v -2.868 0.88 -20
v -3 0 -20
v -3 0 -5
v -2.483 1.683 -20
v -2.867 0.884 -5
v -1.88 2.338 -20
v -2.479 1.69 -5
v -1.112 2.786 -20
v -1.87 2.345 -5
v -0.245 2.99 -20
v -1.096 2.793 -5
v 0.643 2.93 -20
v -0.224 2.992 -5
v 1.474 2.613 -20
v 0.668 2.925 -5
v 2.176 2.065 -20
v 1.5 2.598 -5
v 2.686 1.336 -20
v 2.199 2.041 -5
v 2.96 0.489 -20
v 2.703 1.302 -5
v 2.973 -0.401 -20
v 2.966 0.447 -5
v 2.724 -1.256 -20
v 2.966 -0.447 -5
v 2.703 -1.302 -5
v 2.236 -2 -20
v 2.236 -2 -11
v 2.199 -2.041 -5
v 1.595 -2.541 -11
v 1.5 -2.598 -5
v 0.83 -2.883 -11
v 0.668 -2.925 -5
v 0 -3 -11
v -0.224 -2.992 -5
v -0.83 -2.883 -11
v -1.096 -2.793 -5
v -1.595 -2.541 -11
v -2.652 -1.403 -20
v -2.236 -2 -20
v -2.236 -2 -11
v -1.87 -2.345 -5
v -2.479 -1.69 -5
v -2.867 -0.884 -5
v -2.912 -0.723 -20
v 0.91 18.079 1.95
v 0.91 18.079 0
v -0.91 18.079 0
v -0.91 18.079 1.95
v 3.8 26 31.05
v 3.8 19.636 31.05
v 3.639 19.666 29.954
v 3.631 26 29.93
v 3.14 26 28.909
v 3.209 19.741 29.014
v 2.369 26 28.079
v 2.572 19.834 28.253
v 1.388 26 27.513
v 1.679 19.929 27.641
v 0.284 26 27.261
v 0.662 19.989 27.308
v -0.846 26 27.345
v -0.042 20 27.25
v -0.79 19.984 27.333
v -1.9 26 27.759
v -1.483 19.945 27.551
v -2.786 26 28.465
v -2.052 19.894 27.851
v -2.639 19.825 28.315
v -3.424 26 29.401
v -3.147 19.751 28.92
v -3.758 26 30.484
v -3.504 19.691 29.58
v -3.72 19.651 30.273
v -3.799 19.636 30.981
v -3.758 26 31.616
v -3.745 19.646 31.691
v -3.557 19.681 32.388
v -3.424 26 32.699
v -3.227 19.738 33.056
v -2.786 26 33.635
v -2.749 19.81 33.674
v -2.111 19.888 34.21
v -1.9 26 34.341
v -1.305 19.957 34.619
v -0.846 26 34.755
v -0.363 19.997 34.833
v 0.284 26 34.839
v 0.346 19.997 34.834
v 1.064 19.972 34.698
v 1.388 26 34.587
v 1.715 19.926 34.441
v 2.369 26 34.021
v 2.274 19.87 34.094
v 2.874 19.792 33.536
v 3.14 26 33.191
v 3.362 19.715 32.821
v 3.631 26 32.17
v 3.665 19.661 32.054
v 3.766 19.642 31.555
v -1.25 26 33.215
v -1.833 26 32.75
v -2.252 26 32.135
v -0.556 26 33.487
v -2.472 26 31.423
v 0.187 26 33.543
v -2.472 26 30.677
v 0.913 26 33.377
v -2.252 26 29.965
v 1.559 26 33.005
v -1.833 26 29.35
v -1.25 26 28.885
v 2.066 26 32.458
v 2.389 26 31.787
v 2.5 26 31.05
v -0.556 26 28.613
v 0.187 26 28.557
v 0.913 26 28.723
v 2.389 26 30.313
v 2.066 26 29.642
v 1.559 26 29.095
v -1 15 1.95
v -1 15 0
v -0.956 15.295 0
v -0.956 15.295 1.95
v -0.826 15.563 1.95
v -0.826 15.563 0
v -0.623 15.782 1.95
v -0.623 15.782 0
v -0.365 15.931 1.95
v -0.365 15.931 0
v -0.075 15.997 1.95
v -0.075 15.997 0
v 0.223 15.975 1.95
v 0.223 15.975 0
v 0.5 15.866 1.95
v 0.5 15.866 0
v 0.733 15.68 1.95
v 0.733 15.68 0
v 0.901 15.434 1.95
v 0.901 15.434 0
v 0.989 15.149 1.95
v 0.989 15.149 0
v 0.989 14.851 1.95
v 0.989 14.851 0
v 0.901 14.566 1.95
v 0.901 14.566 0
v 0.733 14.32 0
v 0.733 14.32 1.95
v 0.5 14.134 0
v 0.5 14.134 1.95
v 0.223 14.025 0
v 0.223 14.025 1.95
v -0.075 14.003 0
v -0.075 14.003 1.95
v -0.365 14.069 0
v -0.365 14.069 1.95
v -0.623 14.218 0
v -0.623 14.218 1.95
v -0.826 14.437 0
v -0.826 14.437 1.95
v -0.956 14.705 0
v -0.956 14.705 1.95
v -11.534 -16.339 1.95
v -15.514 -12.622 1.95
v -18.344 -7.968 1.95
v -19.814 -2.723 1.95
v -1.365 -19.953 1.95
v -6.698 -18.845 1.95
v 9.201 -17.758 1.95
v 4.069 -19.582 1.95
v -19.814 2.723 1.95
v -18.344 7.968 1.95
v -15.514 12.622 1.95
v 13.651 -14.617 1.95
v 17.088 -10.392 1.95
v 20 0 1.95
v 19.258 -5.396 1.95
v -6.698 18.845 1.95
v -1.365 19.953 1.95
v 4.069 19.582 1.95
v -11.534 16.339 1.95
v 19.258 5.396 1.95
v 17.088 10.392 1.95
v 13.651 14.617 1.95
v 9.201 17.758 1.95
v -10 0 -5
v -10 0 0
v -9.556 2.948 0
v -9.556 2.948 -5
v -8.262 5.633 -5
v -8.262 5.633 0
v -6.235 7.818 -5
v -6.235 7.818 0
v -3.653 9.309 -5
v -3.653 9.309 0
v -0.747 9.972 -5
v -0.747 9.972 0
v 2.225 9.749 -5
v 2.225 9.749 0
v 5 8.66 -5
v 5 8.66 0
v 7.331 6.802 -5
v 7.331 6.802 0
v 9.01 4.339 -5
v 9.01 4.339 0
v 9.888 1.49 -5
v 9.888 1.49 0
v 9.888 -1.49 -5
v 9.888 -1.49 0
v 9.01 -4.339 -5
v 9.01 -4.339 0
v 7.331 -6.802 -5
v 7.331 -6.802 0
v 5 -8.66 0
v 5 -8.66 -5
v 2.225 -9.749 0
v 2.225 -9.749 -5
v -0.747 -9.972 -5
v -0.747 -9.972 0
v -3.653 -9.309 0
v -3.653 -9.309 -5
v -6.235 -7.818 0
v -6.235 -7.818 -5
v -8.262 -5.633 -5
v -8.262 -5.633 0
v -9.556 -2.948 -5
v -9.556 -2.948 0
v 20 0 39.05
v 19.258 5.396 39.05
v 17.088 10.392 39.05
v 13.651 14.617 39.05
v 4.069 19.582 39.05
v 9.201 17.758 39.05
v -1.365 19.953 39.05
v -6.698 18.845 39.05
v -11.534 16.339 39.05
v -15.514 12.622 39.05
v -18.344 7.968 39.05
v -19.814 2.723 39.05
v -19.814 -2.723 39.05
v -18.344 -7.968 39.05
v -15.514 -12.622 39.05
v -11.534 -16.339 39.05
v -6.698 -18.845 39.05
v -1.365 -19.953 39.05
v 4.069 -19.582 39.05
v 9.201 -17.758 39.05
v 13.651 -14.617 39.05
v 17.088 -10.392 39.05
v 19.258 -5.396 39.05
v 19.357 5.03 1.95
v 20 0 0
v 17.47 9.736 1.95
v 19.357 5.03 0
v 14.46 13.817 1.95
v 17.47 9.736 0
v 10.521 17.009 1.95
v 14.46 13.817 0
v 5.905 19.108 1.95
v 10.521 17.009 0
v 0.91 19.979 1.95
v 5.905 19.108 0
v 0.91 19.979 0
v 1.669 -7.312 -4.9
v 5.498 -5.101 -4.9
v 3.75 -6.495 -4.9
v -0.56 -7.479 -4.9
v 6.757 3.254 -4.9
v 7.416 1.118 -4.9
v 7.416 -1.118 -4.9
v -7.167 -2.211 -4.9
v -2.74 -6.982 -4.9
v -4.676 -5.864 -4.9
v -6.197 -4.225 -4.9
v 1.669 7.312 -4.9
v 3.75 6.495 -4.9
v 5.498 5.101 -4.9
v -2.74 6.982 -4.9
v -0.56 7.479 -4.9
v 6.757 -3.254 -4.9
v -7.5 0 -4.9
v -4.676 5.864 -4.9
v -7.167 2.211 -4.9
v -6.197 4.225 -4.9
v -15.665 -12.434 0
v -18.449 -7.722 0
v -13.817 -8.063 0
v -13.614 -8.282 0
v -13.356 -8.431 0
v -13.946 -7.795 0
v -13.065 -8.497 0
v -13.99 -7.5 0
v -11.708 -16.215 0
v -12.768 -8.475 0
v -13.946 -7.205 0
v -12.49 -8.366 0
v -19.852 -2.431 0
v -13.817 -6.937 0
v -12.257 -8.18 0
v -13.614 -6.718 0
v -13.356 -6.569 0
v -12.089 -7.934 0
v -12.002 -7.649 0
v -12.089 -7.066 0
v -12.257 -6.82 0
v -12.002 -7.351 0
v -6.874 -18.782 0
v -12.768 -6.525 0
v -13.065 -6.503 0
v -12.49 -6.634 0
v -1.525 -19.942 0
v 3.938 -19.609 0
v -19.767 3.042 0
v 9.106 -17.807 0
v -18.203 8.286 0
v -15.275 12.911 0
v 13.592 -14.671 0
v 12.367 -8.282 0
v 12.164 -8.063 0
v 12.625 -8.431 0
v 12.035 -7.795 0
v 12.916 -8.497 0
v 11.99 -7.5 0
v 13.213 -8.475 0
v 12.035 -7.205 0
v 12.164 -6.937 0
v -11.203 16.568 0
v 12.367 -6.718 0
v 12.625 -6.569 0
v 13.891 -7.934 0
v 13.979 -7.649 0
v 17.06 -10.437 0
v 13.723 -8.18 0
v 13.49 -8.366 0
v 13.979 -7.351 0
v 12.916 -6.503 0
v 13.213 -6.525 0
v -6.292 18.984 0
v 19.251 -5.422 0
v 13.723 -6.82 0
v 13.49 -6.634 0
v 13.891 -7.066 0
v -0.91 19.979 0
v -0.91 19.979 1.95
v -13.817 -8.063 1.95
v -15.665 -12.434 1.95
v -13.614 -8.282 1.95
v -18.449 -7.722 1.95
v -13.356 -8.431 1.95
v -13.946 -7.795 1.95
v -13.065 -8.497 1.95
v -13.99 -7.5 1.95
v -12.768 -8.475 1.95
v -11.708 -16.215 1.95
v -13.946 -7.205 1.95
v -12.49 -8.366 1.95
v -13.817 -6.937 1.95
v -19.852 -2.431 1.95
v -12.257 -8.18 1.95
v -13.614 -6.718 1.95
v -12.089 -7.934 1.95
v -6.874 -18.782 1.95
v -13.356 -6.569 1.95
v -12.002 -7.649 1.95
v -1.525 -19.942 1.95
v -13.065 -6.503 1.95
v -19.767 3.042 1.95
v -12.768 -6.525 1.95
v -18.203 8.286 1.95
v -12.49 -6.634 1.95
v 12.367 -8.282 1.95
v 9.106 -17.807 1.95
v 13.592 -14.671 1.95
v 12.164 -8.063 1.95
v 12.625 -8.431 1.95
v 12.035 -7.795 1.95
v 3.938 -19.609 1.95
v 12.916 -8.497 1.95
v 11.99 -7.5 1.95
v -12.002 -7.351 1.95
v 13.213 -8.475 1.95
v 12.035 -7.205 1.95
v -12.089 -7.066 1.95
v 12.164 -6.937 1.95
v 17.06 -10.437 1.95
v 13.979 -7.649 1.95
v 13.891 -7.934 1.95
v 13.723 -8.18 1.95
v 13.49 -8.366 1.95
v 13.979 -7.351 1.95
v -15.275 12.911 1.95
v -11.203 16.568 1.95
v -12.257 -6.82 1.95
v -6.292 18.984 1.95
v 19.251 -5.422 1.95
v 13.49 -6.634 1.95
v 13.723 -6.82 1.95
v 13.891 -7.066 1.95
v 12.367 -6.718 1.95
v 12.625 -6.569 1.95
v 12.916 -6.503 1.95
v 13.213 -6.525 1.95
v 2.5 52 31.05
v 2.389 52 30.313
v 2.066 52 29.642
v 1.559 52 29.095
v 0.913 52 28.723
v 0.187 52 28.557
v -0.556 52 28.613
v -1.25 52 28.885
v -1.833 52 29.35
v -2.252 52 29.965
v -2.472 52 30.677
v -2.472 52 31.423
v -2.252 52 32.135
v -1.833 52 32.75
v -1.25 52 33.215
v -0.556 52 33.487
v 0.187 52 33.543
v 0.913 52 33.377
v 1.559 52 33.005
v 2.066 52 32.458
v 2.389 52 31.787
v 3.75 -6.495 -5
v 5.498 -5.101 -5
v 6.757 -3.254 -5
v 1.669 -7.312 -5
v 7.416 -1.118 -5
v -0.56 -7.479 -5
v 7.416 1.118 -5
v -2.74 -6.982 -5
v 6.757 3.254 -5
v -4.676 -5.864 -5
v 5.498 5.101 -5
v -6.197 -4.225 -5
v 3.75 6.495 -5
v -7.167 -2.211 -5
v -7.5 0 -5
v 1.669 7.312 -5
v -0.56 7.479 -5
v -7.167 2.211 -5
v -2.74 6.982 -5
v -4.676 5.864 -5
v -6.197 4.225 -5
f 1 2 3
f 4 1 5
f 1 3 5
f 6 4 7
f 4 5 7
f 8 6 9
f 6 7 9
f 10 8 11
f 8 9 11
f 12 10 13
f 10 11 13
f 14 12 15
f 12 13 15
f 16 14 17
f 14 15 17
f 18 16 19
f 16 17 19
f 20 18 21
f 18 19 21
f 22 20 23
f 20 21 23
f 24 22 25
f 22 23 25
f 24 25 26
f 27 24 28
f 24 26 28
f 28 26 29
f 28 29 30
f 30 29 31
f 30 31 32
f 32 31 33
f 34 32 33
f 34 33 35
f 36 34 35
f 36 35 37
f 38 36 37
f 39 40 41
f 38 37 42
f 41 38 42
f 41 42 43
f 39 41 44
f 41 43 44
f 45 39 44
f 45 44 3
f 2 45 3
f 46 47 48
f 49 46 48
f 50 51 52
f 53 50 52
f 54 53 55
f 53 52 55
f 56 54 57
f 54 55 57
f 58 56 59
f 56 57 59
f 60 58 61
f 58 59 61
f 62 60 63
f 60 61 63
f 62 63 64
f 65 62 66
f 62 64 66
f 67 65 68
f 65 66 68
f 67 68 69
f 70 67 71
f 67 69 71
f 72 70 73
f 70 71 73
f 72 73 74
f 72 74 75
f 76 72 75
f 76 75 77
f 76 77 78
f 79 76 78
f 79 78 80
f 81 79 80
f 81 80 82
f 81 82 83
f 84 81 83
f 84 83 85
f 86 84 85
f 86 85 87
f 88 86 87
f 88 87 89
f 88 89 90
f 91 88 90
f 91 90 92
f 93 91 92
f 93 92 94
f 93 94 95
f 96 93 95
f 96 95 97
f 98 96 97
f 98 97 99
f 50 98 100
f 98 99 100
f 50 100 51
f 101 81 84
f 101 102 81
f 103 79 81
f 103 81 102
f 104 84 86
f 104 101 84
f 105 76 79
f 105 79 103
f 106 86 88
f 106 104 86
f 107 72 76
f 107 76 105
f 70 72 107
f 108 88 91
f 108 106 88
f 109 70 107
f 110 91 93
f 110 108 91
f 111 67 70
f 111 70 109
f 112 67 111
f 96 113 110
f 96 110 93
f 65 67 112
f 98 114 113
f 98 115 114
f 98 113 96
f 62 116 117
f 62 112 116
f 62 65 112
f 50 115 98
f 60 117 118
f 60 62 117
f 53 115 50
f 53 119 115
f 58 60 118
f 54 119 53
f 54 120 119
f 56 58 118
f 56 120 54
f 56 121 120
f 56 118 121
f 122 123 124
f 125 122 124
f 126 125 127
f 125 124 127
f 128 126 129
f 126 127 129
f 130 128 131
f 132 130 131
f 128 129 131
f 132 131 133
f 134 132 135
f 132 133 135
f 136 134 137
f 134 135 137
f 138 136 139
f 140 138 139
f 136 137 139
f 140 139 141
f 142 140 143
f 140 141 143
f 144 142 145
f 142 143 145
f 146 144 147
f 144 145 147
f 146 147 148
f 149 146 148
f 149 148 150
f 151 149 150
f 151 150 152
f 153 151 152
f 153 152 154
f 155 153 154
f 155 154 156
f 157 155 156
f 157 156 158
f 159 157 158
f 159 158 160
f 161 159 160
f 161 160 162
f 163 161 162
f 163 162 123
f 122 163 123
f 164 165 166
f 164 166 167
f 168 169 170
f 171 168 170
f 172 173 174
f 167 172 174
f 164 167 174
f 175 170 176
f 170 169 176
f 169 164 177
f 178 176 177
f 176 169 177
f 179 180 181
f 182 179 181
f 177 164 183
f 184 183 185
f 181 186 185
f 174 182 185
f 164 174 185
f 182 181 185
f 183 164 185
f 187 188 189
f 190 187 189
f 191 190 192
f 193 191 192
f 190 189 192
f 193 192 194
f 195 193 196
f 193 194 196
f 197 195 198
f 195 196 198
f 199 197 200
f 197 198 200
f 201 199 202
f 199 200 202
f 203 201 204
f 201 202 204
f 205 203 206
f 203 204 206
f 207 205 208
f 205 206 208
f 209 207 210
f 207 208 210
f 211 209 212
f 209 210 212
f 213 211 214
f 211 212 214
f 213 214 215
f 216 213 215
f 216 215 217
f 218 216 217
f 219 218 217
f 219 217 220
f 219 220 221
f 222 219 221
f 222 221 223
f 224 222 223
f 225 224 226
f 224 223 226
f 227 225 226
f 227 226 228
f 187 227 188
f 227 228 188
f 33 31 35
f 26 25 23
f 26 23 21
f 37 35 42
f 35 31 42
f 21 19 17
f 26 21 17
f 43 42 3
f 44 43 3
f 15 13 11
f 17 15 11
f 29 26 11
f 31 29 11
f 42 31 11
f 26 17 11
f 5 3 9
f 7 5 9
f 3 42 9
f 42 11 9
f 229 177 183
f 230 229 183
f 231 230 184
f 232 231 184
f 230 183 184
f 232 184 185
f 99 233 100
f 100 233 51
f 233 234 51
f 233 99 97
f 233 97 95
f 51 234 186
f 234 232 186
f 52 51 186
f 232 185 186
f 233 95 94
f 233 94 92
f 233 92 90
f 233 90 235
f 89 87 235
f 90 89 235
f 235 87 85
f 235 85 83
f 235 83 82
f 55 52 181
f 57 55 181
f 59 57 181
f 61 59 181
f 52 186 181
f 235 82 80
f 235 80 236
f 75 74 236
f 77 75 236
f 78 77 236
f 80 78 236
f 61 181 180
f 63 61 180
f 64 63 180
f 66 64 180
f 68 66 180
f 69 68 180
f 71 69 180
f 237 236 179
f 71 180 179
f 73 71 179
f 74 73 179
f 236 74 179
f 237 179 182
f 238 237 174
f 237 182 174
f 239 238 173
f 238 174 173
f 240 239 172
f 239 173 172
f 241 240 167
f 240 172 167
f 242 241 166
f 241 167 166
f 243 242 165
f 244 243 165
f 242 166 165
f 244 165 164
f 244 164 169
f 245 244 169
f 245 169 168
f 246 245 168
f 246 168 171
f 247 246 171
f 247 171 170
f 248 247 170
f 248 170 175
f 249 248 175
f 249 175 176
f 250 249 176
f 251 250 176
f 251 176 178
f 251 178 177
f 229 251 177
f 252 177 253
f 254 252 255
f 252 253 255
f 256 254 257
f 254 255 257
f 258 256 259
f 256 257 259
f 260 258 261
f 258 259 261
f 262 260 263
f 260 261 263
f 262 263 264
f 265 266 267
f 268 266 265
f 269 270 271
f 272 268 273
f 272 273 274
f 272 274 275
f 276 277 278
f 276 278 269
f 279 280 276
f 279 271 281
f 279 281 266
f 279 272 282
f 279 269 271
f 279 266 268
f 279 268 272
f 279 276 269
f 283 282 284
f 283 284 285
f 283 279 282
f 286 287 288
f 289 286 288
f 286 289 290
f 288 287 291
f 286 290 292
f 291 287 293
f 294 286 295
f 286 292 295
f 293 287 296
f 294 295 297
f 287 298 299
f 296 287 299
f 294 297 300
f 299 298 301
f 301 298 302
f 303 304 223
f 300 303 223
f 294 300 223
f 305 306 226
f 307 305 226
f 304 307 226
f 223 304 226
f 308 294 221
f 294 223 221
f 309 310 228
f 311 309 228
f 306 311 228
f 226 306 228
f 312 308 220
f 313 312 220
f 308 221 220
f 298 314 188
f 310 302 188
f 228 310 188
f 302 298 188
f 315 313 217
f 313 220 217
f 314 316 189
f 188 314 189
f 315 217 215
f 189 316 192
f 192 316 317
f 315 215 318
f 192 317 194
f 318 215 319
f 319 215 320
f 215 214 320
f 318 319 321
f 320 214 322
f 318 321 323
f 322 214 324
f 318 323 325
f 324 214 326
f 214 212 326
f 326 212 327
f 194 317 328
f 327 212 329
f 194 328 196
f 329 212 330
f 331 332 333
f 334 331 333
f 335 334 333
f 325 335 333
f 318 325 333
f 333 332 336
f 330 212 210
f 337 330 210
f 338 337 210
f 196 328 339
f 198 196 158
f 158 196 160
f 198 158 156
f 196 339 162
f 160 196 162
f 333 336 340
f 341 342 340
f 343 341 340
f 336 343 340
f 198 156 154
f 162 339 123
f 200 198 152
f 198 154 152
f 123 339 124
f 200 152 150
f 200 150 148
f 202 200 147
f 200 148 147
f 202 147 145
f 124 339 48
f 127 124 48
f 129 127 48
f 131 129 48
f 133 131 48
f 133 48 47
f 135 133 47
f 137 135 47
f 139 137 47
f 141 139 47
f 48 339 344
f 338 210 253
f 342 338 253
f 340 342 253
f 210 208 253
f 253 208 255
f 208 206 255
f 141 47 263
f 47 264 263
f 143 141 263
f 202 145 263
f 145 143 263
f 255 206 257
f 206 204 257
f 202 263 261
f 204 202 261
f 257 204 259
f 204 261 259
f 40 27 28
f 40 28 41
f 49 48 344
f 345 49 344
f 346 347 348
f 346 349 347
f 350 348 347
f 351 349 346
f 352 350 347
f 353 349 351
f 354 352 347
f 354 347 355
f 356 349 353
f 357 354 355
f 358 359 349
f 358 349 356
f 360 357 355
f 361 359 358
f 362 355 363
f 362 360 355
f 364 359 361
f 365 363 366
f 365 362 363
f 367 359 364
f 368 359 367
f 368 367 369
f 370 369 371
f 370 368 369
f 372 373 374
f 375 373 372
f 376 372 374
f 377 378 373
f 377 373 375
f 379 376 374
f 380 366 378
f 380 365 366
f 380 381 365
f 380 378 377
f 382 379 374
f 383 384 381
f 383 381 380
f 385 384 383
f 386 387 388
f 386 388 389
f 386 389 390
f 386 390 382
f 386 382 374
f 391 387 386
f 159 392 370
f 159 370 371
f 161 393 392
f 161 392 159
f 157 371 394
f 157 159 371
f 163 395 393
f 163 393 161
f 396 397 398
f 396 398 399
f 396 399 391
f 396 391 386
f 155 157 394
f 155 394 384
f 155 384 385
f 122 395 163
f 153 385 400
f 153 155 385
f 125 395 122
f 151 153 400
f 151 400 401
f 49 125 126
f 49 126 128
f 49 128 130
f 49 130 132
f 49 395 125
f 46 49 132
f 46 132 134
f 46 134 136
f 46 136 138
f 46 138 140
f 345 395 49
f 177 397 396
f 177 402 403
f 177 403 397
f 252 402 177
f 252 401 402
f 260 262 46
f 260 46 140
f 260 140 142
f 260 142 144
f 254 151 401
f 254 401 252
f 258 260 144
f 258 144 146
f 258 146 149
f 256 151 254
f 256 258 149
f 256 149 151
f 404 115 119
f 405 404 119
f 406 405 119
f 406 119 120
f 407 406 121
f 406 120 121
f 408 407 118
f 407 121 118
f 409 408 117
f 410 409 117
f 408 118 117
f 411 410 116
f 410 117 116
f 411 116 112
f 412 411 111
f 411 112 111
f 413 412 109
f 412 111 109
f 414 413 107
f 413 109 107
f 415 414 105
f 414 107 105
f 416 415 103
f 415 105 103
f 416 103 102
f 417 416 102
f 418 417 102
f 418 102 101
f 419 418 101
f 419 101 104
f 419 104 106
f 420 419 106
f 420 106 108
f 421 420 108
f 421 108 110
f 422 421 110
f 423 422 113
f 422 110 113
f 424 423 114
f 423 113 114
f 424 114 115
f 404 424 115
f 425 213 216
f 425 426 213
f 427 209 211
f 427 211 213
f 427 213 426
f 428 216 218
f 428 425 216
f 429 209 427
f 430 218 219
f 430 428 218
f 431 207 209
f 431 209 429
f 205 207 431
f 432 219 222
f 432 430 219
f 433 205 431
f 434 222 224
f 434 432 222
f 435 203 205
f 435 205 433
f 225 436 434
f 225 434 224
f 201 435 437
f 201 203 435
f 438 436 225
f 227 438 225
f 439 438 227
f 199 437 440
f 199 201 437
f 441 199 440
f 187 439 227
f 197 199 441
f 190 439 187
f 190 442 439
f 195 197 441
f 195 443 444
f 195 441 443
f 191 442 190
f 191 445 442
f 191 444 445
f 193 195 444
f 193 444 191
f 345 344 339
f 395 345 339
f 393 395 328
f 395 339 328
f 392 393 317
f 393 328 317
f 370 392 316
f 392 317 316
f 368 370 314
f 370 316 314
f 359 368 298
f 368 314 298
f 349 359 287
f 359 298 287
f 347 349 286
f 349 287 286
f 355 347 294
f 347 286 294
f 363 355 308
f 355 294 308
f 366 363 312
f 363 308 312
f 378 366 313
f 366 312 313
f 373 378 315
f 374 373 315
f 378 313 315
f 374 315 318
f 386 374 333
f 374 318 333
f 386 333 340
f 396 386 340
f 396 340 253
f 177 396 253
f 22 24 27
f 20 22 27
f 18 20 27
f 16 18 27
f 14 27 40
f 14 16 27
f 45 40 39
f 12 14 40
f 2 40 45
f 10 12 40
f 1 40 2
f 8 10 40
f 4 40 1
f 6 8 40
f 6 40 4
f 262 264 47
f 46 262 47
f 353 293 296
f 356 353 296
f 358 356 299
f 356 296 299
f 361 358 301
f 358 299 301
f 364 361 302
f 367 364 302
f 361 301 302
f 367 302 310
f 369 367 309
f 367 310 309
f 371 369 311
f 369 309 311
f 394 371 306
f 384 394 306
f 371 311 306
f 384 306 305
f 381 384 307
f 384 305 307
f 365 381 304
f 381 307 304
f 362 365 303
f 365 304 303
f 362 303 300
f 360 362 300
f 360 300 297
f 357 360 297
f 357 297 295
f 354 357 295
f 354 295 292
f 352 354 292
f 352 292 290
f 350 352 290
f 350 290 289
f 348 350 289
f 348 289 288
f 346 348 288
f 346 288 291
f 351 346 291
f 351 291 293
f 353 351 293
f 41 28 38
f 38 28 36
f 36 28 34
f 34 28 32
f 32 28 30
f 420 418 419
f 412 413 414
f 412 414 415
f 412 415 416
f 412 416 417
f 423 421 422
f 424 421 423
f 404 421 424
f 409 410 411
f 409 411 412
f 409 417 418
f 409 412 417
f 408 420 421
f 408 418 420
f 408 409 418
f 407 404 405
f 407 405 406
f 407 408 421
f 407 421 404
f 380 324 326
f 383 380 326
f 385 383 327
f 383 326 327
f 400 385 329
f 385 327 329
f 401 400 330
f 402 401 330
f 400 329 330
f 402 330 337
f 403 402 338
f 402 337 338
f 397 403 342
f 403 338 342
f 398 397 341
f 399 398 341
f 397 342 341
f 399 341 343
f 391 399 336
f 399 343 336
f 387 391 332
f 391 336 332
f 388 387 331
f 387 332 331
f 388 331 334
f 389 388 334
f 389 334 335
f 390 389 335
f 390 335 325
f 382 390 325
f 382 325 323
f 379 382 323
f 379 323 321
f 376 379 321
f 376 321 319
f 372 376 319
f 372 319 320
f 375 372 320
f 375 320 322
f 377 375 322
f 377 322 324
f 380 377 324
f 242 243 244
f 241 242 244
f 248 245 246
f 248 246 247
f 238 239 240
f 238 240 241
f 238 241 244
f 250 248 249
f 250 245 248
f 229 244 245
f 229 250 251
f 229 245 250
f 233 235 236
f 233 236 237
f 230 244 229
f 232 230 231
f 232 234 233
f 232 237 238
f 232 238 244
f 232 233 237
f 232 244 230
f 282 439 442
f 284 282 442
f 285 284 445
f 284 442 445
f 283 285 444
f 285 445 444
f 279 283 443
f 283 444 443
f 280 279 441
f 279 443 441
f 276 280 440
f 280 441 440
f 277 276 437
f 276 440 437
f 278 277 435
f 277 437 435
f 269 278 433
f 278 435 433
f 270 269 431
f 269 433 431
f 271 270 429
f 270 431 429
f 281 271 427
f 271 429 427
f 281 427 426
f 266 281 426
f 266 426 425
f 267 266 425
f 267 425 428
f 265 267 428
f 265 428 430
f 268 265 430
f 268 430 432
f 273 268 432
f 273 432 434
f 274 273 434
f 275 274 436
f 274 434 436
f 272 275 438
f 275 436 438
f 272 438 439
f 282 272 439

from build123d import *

# Parameters (mm, degrees)
SKETCH1_R           = 20
BOSS_EXTRUDE1_DEPTH = 1.95
SKETCH2_R           = 10
BOSS_EXTRUDE2_DEPTH = 5
SKETCH3_R           = 3
BOSS_EXTRUDE3_DEPTH = 15
SKETCH4_R           = 1
CUT_EXTRUDE1_DEPTH  = 10
CUT_EXTRUDE2_DEPTH  = 2.3
SKETCH6_R           = 20
BOSS_EXTRUDE5_DEPTH = 37.1
SKETCH7_R           = 7.5
CUT_EXTRUDE3_DEPTH  = 0.1
SKETCH9_R           = 3.8
BOSS_EXTRUDE6_DEPTH = 26
SKETCH10_R          = 2.5
BOSS_EXTRUDE7_DEPTH = 26
SKETCH11_W          = 6.12779924
SKETCH11_H          = 1.319674488
CUT_EXTRUDE4_DEPTH  = 9


with BuildPart() as part:
    # Sketch1 → Boss-Extrude1 (new body)
    with BuildSketch(Plane.XY):
        Circle(SKETCH1_R)
    extrude(amount=BOSS_EXTRUDE1_DEPTH)

    # Sketch2 → Boss-Extrude2 (add)
    with BuildSketch(Plane(origin=(0, 0, 0), x_dir=(-1, 0, 0), z_dir=(0, 0, -1))):
        Circle(SKETCH2_R)
    extrude(amount=BOSS_EXTRUDE2_DEPTH)

    # Sketch3 → Boss-Extrude3 (add)
    with BuildSketch(Plane(origin=(0, 0, -5), x_dir=(-1, 0, 0), z_dir=(0, 0, -1))):
        Circle(SKETCH3_R)
    extrude(amount=BOSS_EXTRUDE3_DEPTH)

    # Sketch4 → Cut-Extrude1 (cut)
    with BuildSketch(Plane(origin=(0, 0, 0), x_dir=(-1, 0, 0), z_dir=(0, 0, -1))):
        with Locations((0, 15)):
            Circle(SKETCH4_R)
        with Locations((12.990381057, -7.5)):
            Circle(SKETCH4_R)
        with Locations((-12.990381057, -7.5)):
            Circle(SKETCH4_R)
    extrude(amount=-CUT_EXTRUDE1_DEPTH, mode=Mode.SUBTRACT)

    # Sketch5 → Cut-Extrude2 (cut)
    with BuildSketch(Plane(origin=(0, 0, 0), x_dir=(-1, 0, 0), z_dir=(0, 0, -1))):
        with BuildLine():
            ThreePointArc((0.91, 19.979286774), (0.455117852, 19.994821023), (0, 20))
            Line((0, 20), (0, 18.079462351))
            Line((0, 18.079462351), (0.91, 18.079462351))
            Line((0.91, 18.079462351), (0.91, 19.979286774))
        make_face()
        with BuildLine():
            Line((0, 18.079462351), (0, 20))
            ThreePointArc((0, 20), (-0.455117852, 19.994821023), (-0.91, 19.979286774))
            Line((-0.91, 19.979286774), (-0.91, 18.079462351))
            Line((-0.91, 18.079462351), (0, 18.079462351))
        make_face()
    extrude(amount=-CUT_EXTRUDE2_DEPTH, mode=Mode.SUBTRACT)

    # Sketch7 → Cut-Extrude3 (cut)
    with BuildSketch(Plane(origin=(0, 0, -5), x_dir=(-1, 0, 0), z_dir=(0, 0, -1))):
        Circle(SKETCH7_R)
    extrude(amount=-CUT_EXTRUDE3_DEPTH, mode=Mode.SUBTRACT)

    # Sketch11 → Cut-Extrude4 (cut)
    with BuildSketch(Plane(origin=(0, 0, -20), x_dir=(-1, 0, 0), z_dir=(0, 0, -1))):
        with Locations((0.136461737, -2.659837244)):
            Rectangle(SKETCH11_W, SKETCH11_H)
    extrude(amount=-CUT_EXTRUDE4_DEPTH, mode=Mode.SUBTRACT)


with BuildPart() as body_2:
    # Sketch6 → Boss-Extrude5 (new body)
    with BuildSketch(Plane.XY.offset(1.95)):
        Circle(SKETCH6_R)
    extrude(amount=BOSS_EXTRUDE5_DEPTH)

    # Sketch9 → Boss-Extrude6 (add)
    with BuildSketch(Plane(origin=(0, 0, 0), x_dir=(1, 0, 0), z_dir=(0, 1, 0))):
        with Locations((0, -31.05)):
            Circle(SKETCH9_R)
    extrude(amount=BOSS_EXTRUDE6_DEPTH)

    # Sketch10 → Boss-Extrude7 (add)
    with BuildSketch(Plane(origin=(0, 26, 0), x_dir=(1, 0, 0), z_dir=(0, 1, 0))):
        with Locations((0, -31.05)):
            Circle(SKETCH10_R)
    extrude(amount=BOSS_EXTRUDE7_DEPTH)


solid = Compound([part.part, body_2.part])
